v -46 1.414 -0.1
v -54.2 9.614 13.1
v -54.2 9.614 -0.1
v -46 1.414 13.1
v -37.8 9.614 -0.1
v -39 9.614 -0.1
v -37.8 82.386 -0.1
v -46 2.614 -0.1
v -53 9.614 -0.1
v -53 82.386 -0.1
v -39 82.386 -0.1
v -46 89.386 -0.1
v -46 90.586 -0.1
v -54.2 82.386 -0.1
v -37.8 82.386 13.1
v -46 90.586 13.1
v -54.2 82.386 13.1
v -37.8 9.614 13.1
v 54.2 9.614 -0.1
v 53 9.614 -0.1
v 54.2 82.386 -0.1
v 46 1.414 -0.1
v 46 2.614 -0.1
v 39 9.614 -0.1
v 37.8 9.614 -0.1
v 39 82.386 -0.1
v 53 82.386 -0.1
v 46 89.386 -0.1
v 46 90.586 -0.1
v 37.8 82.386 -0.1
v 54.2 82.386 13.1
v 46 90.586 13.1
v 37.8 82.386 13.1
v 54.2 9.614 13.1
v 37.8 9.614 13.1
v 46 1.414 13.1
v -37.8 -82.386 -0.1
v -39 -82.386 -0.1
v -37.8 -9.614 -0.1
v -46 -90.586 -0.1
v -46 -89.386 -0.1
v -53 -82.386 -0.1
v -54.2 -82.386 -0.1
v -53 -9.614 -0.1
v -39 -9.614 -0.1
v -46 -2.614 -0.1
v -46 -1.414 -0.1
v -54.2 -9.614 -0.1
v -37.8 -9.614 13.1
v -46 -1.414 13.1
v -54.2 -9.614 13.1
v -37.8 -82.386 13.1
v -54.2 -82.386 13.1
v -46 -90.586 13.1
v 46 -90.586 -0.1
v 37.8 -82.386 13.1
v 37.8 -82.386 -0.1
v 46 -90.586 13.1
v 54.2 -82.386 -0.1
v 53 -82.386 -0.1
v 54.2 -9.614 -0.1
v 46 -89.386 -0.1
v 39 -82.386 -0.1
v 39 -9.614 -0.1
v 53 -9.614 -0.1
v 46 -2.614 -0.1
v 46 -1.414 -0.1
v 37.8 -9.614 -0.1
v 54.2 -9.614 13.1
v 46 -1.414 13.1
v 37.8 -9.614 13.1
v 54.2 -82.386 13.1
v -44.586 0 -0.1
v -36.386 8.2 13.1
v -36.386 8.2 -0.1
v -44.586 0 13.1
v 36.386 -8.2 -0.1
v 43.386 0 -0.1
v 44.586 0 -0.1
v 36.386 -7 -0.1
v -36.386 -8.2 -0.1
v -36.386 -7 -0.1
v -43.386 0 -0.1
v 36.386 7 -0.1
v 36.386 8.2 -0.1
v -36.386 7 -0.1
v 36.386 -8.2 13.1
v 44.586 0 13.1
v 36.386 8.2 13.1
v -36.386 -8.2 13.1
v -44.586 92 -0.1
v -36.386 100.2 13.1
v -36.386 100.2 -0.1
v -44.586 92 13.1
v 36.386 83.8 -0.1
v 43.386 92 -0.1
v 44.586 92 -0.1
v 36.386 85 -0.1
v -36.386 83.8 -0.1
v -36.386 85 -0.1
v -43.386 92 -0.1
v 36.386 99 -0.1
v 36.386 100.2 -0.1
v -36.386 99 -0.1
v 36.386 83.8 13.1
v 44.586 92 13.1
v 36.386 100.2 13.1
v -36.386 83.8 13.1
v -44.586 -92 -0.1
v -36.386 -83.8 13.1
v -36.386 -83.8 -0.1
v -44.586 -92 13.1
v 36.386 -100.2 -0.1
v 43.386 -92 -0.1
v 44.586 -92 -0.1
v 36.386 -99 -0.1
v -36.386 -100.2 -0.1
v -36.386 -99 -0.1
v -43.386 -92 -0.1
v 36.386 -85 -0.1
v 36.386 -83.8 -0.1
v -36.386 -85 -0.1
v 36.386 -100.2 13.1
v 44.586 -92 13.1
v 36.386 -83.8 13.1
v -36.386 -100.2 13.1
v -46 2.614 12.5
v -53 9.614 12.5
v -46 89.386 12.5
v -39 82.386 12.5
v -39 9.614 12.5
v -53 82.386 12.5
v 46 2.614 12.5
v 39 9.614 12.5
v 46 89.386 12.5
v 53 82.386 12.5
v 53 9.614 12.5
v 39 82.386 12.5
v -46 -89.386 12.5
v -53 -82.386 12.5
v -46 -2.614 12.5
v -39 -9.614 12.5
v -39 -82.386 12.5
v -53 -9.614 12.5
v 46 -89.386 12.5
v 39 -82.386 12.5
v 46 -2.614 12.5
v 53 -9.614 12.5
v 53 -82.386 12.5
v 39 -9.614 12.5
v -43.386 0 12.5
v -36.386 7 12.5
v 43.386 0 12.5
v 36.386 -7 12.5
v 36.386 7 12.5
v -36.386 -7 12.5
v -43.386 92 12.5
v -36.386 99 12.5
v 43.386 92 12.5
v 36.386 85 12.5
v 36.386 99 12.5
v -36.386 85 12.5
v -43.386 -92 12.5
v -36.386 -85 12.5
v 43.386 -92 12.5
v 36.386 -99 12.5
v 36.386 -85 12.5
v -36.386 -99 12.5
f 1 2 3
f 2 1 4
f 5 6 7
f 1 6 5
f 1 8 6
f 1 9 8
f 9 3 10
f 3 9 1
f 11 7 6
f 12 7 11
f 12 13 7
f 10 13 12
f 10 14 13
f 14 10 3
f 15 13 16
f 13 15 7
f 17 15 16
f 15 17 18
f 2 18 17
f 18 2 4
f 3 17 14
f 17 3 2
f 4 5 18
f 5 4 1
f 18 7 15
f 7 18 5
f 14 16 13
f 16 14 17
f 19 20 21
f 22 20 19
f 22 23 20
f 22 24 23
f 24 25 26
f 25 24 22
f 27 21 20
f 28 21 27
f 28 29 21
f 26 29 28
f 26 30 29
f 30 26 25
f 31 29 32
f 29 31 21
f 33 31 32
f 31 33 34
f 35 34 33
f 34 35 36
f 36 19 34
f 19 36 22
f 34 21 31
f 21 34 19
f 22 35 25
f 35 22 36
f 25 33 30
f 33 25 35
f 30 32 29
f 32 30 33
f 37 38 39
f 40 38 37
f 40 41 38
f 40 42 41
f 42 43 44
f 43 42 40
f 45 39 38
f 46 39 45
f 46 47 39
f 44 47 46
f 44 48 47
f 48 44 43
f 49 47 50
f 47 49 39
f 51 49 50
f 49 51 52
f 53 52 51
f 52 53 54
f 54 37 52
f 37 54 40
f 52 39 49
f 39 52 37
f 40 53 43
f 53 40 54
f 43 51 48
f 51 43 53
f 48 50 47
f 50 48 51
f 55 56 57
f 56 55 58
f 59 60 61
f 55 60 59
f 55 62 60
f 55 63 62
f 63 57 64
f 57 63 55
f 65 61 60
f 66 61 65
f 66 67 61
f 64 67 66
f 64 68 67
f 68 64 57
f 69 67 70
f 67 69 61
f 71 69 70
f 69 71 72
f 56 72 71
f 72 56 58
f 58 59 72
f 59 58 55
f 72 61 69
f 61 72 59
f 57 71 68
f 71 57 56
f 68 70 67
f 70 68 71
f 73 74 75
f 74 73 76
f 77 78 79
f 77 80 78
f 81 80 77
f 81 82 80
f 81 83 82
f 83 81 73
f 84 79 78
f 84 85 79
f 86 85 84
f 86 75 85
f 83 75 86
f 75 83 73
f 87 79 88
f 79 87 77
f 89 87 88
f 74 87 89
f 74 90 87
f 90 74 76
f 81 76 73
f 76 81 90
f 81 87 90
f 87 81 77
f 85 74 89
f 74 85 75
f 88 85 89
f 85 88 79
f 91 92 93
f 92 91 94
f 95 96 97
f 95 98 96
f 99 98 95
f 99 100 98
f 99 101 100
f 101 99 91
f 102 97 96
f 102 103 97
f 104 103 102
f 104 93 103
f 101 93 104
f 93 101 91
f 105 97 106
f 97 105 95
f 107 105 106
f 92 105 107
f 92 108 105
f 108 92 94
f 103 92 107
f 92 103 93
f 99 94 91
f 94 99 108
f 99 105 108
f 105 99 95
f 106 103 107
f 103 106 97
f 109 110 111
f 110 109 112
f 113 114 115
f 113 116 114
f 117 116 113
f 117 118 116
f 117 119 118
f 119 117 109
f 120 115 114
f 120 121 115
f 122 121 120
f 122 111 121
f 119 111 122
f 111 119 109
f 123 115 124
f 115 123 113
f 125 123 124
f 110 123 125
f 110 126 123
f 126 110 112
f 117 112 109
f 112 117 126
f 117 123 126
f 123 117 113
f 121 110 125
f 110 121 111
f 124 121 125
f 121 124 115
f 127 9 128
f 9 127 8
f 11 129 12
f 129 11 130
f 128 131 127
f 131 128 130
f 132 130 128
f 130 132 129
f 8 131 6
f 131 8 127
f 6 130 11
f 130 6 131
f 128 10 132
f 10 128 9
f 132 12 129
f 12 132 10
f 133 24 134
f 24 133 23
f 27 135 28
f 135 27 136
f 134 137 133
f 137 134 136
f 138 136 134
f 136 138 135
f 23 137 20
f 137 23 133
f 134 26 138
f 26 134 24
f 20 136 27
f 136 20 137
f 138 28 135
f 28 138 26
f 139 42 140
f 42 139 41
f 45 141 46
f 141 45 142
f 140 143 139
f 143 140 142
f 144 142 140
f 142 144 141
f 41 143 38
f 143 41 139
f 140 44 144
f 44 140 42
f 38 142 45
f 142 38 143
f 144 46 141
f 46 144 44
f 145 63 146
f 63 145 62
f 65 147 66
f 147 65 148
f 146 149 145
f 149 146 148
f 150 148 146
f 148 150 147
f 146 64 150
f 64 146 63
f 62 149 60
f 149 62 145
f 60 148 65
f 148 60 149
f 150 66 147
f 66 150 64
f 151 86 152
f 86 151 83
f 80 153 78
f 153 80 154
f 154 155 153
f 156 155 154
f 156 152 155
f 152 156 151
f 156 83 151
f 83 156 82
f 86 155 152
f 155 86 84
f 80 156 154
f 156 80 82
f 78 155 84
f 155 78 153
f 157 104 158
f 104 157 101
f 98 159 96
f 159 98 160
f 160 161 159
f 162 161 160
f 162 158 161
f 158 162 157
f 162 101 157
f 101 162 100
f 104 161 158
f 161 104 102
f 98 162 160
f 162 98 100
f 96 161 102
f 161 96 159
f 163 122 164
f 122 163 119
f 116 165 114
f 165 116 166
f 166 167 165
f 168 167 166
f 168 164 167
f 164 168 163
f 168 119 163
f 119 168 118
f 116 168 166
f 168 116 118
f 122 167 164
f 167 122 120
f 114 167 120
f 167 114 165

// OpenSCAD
// Modular 7-Segment Lightguide / Diffuser (Parametric)
// Solid continuous reflector walls (No wire/connector cutouts)
// Optimized for maximum brightness: 0.6mm and 0.8mm top diffuser layer variants

// --- Configuration Parameter ---
diffuser_thick = 0.6; // [0.6: High Brightness (0.6mm), 0.8: Balanced (0.8mm), 1.0: Standard (1.0mm)]

total_depth = 13.0;   // Matches frontplate housing depth (13.0 mm)
tunnel_depth = total_depth - diffuser_thick; // Inner cavity depth (12.4mm for 0.6, 12.2mm for 0.8)

// --- Dimensions (matching 7segment_pogo / 7segment_v1) ---
pitch_x = 92;
pitch_y_top = 92;
pitch_y_bot = 92;
strip_width = 12;
white_wall = 1.2;
front_wall = 2.0;

diffuser_w = strip_width + 2;               // 14 mm
total_seg_w = diffuser_w + white_wall * 2;  // 16.4 mm

total_seg_l_x = pitch_x - front_wall * 1.4142;
total_seg_l_y_top = pitch_y_top - front_wall * 1.4142;
total_seg_l_y_bot = pitch_y_bot - front_wall * 1.4142;
diffuser_l_x = total_seg_l_x - white_wall * 2;
diffuser_l_y_top = total_seg_l_y_top - white_wall * 2;
diffuser_l_y_bot = total_seg_l_y_bot - white_wall * 2;

// --- Shapes & Helpers ---
module segment_shape(l, w, h) {
    translate([0, 0, -0.1])
    linear_extrude(height = h + 0.2)
    polygon([
        [-l/2 + w/2, -w/2],
        [l/2 - w/2, -w/2],
        [l/2, 0],
        [l/2 - w/2, w/2],
        [-l/2 + w/2, w/2],
        [-l/2, 0]
    ]);
}

module layout_horiz(is_top=false, is_bot=false) {
    if (is_top) {
        translate([0, pitch_y_top, 0]) children();
    } else if (is_bot) {
        translate([0, -pitch_y_bot, 0]) children();
    } else {
        translate([0, 0, 0]) children();
    }
}

module layout_vert(is_top=false) {
    if (is_top) {
        translate([-pitch_x/2, pitch_y_top/2, 0]) rotate([0, 0, 90]) children();
        translate([pitch_x/2, pitch_y_top/2, 0]) rotate([0, 0, 90]) children();
    } else {
        translate([-pitch_x/2, -pitch_y_bot/2, 0]) rotate([0, 0, 90]) children();
        translate([pitch_x/2, -pitch_y_bot/2, 0]) rotate([0, 0, 90]) children();
    }
}

module frontplate_white(d_thick = diffuser_thick) {
    t_depth = total_depth - d_thick;
    difference() {
        // Outer white reflector walls + top diffuser (Total depth = 13.0 mm)
        union() {
            layout_horiz(false, false) segment_shape(total_seg_l_x, total_seg_w, total_depth);
            layout_horiz(true, false) segment_shape(total_seg_l_x, total_seg_w, total_depth);
            layout_horiz(false, true) segment_shape(total_seg_l_x, total_seg_w, total_depth);
            layout_vert(true) segment_shape(total_seg_l_y_top, total_seg_w, total_depth);
            layout_vert(false) segment_shape(total_seg_l_y_bot, total_seg_w, total_depth);
        }
            
        // Hollow light tunnel cavity, leaving d_thick solid diffuser face on top
        layout_horiz(false, false) segment_shape(diffuser_l_x, diffuser_w, t_depth);
        layout_horiz(true, false) segment_shape(diffuser_l_x, diffuser_w, t_depth);
        layout_horiz(false, true) segment_shape(diffuser_l_x, diffuser_w, t_depth);
        layout_vert(true) segment_shape(diffuser_l_y_top, diffuser_w, t_depth);
        layout_vert(false) segment_shape(diffuser_l_y_bot, diffuser_w, t_depth);
    }
}

// Default render
color("White") frontplate_white(diffuser_thick);
